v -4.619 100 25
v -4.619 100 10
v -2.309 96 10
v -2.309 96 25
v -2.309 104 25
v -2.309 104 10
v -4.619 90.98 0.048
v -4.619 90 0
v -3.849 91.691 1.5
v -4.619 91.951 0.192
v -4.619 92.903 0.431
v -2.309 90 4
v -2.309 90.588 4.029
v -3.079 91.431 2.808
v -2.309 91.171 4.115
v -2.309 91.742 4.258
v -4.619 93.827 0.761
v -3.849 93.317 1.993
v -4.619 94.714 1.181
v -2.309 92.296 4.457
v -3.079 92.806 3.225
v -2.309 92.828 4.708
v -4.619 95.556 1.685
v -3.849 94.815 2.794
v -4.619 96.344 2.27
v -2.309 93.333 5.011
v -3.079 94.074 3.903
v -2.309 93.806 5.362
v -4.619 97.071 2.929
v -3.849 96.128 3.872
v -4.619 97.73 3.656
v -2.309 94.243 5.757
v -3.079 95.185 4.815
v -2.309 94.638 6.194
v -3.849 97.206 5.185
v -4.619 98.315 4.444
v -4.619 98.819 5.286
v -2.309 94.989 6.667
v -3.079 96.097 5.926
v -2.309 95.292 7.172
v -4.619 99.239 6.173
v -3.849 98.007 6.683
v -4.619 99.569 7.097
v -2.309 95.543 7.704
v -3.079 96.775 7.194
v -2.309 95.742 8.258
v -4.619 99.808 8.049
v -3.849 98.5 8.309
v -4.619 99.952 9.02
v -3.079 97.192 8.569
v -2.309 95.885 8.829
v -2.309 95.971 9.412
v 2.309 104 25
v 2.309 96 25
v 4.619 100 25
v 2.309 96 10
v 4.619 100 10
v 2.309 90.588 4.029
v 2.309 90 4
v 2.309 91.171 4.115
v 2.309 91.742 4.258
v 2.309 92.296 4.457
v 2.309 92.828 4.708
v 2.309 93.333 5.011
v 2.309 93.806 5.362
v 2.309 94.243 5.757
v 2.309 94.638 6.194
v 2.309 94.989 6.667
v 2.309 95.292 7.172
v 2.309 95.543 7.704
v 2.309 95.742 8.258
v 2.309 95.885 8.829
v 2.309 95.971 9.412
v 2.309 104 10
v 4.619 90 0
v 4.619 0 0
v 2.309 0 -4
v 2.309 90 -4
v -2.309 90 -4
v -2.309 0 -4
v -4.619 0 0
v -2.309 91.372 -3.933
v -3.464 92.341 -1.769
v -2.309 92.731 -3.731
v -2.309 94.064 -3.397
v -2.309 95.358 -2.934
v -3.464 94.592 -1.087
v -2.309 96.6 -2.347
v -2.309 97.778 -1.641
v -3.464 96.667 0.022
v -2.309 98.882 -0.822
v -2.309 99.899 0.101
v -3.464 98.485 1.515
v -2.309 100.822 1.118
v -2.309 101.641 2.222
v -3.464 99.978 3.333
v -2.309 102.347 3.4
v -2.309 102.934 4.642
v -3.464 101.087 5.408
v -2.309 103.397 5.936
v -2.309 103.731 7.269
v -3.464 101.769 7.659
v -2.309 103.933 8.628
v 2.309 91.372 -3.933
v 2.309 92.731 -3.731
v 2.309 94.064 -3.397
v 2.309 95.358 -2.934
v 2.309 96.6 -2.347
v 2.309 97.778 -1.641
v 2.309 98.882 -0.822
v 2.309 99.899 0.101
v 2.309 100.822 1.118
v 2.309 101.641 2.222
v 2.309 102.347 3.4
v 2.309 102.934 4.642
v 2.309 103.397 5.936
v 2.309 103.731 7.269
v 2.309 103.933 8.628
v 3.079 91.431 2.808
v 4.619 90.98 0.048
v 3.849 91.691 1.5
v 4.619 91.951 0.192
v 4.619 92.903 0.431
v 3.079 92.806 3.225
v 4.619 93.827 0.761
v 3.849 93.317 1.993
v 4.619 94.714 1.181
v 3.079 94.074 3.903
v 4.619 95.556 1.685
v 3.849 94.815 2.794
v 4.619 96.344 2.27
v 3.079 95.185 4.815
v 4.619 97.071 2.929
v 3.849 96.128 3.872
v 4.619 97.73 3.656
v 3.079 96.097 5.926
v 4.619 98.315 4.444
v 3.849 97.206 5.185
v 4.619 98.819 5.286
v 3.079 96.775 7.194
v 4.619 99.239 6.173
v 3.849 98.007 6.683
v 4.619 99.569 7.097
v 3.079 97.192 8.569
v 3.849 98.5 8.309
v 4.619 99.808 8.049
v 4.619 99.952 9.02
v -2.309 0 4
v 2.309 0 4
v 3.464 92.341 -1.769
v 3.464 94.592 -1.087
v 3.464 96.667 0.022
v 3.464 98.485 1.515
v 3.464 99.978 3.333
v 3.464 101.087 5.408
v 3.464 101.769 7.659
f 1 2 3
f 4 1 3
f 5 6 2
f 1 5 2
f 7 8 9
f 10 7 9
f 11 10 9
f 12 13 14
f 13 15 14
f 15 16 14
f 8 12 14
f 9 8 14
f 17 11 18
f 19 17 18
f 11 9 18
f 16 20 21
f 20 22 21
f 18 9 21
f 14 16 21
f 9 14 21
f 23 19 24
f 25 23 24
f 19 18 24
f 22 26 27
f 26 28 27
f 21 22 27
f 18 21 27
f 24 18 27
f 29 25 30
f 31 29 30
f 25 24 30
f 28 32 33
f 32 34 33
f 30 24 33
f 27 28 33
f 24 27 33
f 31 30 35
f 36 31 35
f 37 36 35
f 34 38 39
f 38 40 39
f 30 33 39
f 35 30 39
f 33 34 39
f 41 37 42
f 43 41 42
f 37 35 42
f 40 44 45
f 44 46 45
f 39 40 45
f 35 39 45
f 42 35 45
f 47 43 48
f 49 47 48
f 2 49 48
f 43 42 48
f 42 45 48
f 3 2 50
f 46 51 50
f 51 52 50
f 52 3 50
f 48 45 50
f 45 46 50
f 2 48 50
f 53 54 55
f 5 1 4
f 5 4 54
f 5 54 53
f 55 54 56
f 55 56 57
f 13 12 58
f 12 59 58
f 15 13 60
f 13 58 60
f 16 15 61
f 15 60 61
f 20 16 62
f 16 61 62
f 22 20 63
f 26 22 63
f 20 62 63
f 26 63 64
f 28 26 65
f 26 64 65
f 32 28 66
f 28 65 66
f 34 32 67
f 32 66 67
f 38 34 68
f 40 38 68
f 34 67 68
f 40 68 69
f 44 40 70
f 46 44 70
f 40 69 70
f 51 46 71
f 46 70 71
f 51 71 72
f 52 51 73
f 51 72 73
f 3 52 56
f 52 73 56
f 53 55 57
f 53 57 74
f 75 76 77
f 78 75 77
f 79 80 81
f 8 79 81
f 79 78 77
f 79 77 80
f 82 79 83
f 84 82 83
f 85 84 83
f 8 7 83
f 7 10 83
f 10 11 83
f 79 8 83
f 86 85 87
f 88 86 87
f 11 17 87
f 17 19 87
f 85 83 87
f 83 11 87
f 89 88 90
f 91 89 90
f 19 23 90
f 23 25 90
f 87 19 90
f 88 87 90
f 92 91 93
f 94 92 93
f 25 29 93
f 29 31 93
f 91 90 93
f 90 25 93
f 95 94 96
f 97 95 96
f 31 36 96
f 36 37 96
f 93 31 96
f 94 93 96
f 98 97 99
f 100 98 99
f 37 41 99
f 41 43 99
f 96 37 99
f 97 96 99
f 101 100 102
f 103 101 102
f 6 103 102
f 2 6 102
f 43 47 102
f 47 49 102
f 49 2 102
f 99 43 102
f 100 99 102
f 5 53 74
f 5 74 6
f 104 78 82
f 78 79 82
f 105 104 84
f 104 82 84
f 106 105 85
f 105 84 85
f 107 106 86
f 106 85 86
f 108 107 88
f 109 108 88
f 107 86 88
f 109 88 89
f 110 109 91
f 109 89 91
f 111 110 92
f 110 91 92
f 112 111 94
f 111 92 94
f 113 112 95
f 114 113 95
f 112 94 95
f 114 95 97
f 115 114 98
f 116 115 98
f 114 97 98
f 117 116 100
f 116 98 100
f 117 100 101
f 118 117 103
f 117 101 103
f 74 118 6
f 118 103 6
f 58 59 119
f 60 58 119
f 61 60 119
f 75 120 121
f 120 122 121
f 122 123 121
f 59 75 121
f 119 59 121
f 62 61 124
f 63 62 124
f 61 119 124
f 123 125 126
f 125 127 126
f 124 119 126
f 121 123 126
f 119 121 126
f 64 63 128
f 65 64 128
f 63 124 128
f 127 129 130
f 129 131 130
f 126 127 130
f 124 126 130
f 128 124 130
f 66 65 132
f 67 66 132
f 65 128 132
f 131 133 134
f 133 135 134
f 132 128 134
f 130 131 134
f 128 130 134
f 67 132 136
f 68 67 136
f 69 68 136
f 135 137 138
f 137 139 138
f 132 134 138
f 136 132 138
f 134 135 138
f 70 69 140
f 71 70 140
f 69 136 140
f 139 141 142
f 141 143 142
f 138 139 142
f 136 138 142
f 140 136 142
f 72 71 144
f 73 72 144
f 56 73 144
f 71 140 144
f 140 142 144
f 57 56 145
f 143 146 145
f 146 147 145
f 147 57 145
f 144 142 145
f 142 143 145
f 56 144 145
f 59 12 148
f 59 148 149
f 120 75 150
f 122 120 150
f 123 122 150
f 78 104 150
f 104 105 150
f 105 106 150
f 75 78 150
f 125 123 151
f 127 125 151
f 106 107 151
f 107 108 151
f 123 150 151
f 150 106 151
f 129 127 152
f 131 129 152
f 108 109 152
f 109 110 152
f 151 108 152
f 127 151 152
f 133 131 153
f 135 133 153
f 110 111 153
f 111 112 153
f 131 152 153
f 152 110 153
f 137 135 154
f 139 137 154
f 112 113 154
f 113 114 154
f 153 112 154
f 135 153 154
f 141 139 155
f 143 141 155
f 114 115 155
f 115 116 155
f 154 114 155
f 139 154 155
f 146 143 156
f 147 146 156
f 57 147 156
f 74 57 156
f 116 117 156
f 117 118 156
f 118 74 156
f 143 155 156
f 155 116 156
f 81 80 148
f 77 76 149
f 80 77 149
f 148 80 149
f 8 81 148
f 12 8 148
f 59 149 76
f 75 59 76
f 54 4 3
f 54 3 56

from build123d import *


with BuildPart() as part:
    # Táhnout po křivce1: sweep along a path in Skica4
    with BuildLine(Plane(origin=(0, 0, 0), x_dir=(0, 0, -1), z_dir=(1, 0, 0))) as t_hnout_po_k_ivce1_path:
        Line((0, 0), (0, 90))
        ThreePointArc((0, 90), (-2.928932188, 97.071067812), (-10, 100))
        Line((-10, 100), (-25, 100))
    # Skica2 → Táhnout po křivce1 (sweep)
    with BuildSketch(Plane(origin=(0, 0, 0), x_dir=(1, 0, 0), z_dir=(0, 1, 0))):
        Polygon((2.309401077, -4), (4.618802154, 0), (2.309401077, 4), (-2.309401077, 4), (-4.618802154, 0), (-2.309401077, -4), align=None)
    sweep(path=t_hnout_po_k_ivce1_path.line)


solid = part.part
